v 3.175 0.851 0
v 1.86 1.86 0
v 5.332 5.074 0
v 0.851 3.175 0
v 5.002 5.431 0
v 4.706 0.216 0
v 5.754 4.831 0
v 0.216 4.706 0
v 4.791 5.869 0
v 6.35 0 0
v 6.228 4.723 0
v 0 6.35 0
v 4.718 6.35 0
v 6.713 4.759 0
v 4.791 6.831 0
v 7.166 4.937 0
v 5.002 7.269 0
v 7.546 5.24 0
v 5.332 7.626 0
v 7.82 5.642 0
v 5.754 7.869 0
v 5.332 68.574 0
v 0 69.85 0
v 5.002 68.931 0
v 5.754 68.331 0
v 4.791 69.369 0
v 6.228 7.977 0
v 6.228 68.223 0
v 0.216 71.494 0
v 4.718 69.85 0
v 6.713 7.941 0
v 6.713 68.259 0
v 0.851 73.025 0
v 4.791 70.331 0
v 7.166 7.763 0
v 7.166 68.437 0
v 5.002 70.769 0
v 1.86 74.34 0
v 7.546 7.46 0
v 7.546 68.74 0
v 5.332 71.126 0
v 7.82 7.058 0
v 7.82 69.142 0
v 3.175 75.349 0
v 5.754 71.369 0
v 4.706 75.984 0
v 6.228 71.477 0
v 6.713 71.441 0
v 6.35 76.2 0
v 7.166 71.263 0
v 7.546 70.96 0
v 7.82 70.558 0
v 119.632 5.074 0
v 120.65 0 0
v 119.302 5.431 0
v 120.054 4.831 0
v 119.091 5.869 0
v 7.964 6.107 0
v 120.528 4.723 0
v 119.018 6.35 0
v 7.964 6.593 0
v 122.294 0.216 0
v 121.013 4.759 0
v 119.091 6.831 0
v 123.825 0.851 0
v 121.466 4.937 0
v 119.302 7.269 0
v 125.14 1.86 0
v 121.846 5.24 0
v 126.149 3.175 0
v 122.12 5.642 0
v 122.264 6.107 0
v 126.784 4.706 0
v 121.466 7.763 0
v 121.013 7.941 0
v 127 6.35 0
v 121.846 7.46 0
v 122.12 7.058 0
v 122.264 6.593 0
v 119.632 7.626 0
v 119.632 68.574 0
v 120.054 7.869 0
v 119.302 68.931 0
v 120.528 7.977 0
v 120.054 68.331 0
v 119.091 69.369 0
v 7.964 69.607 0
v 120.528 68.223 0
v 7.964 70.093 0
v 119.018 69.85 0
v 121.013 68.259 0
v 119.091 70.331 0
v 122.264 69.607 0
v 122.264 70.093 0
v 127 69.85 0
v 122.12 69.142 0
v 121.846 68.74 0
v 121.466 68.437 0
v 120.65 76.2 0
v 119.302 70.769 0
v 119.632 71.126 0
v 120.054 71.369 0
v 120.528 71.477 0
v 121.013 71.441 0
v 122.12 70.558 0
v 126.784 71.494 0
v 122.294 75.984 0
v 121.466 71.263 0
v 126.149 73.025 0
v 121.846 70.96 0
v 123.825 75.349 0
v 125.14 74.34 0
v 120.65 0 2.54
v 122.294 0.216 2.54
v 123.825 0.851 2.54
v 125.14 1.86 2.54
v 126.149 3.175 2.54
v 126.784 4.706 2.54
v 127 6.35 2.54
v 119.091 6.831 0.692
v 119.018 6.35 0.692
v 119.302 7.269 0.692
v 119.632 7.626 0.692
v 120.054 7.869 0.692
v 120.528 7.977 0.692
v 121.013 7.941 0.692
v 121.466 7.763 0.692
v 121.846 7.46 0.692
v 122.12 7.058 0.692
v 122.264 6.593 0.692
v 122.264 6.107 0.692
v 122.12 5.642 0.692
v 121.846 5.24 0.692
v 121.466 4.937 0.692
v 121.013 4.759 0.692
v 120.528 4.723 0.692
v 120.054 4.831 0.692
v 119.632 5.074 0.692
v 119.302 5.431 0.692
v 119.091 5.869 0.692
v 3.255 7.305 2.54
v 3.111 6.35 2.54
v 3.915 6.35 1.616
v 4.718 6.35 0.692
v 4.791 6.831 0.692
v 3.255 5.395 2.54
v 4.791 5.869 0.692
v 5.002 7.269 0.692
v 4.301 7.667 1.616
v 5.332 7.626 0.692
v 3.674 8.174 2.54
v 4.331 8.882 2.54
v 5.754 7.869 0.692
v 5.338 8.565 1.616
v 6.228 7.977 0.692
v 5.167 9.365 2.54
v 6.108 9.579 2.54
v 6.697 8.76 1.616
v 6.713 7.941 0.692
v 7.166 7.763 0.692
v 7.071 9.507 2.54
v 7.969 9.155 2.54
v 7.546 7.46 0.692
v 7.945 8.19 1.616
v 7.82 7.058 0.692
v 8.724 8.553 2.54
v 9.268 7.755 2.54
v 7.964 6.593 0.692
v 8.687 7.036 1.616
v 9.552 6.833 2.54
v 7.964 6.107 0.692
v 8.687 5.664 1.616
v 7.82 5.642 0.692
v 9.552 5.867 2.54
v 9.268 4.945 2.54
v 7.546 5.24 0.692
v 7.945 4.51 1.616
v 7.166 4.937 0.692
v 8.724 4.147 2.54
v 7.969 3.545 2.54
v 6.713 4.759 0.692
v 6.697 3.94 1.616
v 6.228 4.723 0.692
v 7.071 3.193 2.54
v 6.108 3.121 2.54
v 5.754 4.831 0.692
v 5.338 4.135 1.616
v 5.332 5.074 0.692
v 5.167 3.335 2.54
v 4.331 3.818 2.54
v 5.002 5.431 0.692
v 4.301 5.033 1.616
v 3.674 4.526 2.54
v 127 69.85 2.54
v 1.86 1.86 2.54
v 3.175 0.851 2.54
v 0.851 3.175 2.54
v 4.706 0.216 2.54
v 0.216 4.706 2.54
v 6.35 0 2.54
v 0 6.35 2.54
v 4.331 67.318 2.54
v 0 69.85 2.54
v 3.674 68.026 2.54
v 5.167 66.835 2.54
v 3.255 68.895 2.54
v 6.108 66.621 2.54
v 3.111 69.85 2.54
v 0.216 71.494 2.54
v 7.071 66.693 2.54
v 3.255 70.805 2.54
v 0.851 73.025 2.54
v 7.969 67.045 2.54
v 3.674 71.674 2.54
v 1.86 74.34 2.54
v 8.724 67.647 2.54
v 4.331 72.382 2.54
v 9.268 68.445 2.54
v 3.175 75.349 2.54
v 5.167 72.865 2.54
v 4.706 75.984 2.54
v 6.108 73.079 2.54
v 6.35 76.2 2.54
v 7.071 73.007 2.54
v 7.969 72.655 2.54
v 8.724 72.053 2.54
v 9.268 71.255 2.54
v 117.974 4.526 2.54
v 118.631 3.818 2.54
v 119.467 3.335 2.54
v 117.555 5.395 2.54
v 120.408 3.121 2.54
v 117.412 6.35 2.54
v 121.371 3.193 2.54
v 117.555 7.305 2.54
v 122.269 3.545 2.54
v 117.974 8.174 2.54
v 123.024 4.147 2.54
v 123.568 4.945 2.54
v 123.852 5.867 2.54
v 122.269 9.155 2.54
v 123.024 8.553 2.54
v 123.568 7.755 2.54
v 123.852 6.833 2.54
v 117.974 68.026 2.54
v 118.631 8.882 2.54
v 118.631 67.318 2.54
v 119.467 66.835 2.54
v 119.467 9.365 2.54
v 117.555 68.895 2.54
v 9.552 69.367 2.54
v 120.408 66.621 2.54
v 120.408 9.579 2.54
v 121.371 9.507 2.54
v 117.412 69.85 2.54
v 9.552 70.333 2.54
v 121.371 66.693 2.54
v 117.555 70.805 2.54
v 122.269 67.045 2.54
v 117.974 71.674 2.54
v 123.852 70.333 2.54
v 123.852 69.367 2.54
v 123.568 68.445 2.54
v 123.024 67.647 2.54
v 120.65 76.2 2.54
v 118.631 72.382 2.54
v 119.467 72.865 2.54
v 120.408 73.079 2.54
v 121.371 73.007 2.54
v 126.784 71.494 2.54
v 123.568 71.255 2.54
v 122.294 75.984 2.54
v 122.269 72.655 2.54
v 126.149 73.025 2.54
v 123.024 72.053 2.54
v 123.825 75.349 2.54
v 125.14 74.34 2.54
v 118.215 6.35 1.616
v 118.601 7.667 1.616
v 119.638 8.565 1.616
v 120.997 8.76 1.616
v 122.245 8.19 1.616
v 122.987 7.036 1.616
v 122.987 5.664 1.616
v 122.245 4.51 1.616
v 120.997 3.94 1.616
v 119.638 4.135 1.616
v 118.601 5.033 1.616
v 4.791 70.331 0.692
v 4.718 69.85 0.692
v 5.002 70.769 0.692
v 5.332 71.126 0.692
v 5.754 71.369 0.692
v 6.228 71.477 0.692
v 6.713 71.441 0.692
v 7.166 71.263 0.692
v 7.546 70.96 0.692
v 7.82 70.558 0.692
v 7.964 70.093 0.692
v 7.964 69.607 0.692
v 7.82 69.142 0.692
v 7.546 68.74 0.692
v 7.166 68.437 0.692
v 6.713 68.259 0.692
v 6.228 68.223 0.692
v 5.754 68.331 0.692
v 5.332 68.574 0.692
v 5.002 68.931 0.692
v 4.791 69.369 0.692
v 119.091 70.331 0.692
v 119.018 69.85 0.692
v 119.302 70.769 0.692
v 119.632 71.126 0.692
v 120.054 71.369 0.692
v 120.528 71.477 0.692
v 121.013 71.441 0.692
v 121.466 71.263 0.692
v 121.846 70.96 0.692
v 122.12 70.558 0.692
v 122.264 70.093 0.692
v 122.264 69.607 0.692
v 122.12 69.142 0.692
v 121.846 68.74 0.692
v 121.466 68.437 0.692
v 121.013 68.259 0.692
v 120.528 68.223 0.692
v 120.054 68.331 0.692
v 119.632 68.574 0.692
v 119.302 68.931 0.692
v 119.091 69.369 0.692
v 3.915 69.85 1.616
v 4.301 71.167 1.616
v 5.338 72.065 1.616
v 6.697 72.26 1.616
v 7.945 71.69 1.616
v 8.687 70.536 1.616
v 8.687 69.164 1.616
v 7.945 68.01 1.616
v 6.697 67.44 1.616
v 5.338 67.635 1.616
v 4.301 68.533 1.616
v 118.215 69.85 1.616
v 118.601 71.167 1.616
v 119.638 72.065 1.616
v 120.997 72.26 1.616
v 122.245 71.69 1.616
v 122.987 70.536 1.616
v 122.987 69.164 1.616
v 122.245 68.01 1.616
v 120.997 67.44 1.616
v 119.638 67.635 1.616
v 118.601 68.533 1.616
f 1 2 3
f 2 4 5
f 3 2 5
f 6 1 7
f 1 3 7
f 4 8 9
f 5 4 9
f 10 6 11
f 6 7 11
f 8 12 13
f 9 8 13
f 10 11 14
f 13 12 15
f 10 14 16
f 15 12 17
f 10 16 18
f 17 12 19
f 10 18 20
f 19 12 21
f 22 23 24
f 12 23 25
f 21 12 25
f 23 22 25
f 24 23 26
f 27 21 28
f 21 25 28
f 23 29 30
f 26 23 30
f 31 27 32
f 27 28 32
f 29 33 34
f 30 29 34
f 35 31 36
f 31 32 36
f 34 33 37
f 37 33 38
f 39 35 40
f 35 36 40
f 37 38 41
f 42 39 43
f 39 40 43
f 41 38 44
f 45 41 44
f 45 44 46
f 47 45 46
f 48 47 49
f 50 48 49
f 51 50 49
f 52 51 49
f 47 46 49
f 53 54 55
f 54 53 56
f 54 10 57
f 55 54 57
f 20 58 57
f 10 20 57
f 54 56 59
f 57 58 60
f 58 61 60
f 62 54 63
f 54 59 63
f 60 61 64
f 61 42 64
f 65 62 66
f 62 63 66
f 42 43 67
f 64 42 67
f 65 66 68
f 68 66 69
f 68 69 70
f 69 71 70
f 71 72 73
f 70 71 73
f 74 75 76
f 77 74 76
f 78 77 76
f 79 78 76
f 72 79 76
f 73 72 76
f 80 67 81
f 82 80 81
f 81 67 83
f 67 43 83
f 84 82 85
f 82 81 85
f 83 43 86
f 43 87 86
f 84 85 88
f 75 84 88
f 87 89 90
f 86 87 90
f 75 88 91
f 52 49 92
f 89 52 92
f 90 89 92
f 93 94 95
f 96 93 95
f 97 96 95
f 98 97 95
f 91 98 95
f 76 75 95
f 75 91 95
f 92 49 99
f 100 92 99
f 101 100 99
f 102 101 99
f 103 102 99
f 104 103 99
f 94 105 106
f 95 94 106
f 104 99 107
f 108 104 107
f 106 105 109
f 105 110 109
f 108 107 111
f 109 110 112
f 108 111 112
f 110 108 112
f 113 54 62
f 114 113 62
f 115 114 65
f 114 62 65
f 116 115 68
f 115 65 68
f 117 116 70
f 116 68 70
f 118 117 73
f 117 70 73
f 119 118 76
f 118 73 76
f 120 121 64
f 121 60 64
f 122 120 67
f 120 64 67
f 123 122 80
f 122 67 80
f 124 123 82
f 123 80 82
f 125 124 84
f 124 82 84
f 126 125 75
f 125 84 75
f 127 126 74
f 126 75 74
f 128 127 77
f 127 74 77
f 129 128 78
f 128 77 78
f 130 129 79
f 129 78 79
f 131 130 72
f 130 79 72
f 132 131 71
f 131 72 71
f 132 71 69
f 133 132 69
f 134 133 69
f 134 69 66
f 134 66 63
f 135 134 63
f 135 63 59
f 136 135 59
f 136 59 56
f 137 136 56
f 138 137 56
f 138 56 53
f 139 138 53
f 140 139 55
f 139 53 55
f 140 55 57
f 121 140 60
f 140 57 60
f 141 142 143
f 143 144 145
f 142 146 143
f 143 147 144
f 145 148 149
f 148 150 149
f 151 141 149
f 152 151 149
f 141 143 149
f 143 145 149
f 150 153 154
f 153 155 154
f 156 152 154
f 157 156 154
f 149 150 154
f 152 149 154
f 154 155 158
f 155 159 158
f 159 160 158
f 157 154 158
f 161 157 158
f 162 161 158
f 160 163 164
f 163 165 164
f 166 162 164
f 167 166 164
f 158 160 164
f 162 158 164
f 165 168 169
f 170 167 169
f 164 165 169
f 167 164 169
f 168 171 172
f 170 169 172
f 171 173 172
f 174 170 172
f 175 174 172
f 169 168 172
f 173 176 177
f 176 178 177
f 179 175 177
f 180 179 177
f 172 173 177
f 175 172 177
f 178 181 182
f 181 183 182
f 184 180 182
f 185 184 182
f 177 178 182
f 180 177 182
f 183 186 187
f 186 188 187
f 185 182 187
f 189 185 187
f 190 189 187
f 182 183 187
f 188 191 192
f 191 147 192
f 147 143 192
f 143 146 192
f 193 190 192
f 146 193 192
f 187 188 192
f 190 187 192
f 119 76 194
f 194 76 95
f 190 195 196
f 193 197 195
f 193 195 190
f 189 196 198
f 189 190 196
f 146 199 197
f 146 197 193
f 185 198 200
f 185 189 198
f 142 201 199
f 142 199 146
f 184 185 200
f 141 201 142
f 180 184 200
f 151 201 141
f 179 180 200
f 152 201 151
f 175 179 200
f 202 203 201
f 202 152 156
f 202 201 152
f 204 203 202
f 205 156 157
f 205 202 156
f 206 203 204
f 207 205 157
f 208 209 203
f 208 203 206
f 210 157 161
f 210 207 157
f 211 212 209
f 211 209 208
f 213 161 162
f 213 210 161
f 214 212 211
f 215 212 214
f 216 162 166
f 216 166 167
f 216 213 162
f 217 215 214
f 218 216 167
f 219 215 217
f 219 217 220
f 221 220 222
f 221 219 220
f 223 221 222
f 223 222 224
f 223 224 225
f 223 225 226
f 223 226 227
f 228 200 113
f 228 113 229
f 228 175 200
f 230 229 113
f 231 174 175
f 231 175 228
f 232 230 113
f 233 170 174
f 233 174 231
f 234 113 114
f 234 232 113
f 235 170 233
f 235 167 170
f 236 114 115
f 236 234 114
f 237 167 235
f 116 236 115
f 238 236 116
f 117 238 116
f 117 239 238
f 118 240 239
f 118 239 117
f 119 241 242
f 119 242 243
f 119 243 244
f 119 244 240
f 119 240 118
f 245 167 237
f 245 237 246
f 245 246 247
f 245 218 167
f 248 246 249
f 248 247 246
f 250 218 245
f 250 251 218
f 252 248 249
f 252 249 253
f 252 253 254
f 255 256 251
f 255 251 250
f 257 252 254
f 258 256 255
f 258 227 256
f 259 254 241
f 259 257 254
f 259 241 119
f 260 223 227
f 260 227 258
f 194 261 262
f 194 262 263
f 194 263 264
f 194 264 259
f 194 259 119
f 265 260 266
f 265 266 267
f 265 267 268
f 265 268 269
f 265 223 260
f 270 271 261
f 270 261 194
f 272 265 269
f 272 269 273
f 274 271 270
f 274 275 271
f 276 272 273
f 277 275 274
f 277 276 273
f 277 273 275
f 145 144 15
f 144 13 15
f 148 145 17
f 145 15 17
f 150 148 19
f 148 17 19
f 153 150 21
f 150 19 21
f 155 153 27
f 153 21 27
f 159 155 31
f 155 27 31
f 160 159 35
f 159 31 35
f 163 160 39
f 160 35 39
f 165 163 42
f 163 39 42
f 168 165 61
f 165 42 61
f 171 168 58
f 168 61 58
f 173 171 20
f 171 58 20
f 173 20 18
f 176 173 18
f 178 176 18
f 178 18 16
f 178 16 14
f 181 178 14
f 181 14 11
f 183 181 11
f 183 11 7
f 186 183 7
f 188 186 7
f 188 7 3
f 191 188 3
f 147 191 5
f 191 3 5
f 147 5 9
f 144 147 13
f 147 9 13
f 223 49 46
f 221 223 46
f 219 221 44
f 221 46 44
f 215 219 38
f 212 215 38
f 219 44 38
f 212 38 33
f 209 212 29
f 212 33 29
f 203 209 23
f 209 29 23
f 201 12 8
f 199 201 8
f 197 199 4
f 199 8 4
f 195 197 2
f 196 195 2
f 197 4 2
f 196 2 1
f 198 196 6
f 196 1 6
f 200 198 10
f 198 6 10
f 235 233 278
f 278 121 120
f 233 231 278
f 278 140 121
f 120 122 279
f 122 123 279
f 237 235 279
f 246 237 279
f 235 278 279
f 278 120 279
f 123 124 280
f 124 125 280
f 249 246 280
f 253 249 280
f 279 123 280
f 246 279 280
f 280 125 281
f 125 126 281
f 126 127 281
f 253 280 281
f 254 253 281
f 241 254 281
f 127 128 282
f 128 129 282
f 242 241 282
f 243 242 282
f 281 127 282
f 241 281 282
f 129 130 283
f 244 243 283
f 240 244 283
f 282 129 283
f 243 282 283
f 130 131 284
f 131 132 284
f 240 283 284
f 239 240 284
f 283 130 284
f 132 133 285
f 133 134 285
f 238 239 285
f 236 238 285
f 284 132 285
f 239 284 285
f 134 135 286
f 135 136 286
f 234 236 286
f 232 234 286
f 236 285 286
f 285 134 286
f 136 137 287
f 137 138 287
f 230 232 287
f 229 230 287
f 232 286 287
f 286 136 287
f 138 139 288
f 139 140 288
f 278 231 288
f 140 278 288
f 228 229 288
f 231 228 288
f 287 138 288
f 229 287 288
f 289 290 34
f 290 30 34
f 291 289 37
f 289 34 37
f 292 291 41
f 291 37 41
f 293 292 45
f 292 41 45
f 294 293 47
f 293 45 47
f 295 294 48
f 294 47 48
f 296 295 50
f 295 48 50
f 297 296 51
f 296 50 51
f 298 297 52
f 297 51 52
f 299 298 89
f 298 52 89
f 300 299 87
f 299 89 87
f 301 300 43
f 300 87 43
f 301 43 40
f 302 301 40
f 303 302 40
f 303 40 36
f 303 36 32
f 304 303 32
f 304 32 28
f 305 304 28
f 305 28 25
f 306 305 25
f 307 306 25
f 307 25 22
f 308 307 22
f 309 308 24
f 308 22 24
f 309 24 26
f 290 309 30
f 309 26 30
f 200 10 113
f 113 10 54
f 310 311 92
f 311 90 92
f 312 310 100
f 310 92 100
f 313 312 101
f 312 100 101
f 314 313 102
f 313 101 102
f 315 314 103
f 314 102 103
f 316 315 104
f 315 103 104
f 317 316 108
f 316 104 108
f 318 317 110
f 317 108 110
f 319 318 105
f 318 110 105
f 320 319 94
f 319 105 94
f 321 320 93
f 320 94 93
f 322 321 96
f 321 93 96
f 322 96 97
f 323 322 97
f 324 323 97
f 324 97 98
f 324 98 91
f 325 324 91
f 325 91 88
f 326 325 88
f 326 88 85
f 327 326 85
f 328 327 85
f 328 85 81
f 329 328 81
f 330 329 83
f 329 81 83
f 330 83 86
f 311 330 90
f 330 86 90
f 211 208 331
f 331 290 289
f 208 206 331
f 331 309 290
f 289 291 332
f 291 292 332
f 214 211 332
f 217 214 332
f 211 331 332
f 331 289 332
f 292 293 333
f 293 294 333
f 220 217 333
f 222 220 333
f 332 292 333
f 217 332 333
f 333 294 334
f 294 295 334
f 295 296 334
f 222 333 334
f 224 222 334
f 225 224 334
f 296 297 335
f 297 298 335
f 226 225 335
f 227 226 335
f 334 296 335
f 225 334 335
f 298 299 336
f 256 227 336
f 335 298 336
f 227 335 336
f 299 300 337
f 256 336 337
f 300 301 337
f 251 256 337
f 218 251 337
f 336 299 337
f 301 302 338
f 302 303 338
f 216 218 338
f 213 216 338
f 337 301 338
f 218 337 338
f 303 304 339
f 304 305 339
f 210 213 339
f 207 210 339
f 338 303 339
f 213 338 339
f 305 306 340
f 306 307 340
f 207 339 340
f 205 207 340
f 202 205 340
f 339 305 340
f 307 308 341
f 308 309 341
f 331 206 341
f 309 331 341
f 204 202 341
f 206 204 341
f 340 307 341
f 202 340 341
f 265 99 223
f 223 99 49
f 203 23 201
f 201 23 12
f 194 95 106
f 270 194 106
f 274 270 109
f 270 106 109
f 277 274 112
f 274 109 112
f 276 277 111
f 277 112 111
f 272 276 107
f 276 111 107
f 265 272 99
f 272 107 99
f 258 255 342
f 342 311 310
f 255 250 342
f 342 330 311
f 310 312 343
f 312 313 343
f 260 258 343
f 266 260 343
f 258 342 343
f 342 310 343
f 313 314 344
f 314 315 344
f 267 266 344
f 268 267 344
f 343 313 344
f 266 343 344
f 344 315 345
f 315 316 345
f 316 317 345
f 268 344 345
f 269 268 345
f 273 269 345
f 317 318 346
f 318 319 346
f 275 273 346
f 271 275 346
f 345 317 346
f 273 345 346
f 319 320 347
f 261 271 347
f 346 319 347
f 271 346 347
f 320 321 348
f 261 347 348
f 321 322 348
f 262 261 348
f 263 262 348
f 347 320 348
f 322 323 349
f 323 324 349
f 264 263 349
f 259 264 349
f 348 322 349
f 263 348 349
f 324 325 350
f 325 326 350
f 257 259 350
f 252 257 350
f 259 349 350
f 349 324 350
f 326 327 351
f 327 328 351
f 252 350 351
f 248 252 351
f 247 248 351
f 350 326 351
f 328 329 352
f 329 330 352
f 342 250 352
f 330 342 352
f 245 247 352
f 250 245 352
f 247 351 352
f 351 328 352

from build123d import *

# Parameters (mm, degrees)
F1_DEPTH       = 2.54
F3_D           = 3.2639
F3_CSINK_D     = 6.477
F3_CSINK_ANGLE = 82


with BuildPart() as f1:
    # F0 (on Top) → F1 (new body)
    with BuildSketch(Plane.XY):
        with BuildLine():
            Line((120.65, 76.2), (6.35, 76.2))
            ThreePointArc((6.35, 76.2), (1.8598719395, 74.3401280605), (0, 69.85))
            Line((0, 69.85), (0, 6.35))
            ThreePointArc((0, 6.35), (1.8598719395, 1.8598719395), (6.35, 0))
            Line((6.35, 0), (120.65, 0))
            ThreePointArc((120.65, 0), (125.1401280605, 1.8598719395), (127, 6.35))
            Line((127, 6.35), (127, 69.85))
            ThreePointArc((127, 69.85), (125.1401280605, 74.3401280605), (120.65, 76.2))
        make_face()
    extrude(amount=F1_DEPTH)

    # F3 (through all)
    with Locations(Plane.XY.offset(2.54)):
        with Locations((6.35, 69.85), (6.35, 6.35), (120.65, 6.35), (120.65, 69.85)):
            CounterSinkHole(F3_D / 2, F3_CSINK_D / 2, counter_sink_angle=F3_CSINK_ANGLE)


solid = f1.part
